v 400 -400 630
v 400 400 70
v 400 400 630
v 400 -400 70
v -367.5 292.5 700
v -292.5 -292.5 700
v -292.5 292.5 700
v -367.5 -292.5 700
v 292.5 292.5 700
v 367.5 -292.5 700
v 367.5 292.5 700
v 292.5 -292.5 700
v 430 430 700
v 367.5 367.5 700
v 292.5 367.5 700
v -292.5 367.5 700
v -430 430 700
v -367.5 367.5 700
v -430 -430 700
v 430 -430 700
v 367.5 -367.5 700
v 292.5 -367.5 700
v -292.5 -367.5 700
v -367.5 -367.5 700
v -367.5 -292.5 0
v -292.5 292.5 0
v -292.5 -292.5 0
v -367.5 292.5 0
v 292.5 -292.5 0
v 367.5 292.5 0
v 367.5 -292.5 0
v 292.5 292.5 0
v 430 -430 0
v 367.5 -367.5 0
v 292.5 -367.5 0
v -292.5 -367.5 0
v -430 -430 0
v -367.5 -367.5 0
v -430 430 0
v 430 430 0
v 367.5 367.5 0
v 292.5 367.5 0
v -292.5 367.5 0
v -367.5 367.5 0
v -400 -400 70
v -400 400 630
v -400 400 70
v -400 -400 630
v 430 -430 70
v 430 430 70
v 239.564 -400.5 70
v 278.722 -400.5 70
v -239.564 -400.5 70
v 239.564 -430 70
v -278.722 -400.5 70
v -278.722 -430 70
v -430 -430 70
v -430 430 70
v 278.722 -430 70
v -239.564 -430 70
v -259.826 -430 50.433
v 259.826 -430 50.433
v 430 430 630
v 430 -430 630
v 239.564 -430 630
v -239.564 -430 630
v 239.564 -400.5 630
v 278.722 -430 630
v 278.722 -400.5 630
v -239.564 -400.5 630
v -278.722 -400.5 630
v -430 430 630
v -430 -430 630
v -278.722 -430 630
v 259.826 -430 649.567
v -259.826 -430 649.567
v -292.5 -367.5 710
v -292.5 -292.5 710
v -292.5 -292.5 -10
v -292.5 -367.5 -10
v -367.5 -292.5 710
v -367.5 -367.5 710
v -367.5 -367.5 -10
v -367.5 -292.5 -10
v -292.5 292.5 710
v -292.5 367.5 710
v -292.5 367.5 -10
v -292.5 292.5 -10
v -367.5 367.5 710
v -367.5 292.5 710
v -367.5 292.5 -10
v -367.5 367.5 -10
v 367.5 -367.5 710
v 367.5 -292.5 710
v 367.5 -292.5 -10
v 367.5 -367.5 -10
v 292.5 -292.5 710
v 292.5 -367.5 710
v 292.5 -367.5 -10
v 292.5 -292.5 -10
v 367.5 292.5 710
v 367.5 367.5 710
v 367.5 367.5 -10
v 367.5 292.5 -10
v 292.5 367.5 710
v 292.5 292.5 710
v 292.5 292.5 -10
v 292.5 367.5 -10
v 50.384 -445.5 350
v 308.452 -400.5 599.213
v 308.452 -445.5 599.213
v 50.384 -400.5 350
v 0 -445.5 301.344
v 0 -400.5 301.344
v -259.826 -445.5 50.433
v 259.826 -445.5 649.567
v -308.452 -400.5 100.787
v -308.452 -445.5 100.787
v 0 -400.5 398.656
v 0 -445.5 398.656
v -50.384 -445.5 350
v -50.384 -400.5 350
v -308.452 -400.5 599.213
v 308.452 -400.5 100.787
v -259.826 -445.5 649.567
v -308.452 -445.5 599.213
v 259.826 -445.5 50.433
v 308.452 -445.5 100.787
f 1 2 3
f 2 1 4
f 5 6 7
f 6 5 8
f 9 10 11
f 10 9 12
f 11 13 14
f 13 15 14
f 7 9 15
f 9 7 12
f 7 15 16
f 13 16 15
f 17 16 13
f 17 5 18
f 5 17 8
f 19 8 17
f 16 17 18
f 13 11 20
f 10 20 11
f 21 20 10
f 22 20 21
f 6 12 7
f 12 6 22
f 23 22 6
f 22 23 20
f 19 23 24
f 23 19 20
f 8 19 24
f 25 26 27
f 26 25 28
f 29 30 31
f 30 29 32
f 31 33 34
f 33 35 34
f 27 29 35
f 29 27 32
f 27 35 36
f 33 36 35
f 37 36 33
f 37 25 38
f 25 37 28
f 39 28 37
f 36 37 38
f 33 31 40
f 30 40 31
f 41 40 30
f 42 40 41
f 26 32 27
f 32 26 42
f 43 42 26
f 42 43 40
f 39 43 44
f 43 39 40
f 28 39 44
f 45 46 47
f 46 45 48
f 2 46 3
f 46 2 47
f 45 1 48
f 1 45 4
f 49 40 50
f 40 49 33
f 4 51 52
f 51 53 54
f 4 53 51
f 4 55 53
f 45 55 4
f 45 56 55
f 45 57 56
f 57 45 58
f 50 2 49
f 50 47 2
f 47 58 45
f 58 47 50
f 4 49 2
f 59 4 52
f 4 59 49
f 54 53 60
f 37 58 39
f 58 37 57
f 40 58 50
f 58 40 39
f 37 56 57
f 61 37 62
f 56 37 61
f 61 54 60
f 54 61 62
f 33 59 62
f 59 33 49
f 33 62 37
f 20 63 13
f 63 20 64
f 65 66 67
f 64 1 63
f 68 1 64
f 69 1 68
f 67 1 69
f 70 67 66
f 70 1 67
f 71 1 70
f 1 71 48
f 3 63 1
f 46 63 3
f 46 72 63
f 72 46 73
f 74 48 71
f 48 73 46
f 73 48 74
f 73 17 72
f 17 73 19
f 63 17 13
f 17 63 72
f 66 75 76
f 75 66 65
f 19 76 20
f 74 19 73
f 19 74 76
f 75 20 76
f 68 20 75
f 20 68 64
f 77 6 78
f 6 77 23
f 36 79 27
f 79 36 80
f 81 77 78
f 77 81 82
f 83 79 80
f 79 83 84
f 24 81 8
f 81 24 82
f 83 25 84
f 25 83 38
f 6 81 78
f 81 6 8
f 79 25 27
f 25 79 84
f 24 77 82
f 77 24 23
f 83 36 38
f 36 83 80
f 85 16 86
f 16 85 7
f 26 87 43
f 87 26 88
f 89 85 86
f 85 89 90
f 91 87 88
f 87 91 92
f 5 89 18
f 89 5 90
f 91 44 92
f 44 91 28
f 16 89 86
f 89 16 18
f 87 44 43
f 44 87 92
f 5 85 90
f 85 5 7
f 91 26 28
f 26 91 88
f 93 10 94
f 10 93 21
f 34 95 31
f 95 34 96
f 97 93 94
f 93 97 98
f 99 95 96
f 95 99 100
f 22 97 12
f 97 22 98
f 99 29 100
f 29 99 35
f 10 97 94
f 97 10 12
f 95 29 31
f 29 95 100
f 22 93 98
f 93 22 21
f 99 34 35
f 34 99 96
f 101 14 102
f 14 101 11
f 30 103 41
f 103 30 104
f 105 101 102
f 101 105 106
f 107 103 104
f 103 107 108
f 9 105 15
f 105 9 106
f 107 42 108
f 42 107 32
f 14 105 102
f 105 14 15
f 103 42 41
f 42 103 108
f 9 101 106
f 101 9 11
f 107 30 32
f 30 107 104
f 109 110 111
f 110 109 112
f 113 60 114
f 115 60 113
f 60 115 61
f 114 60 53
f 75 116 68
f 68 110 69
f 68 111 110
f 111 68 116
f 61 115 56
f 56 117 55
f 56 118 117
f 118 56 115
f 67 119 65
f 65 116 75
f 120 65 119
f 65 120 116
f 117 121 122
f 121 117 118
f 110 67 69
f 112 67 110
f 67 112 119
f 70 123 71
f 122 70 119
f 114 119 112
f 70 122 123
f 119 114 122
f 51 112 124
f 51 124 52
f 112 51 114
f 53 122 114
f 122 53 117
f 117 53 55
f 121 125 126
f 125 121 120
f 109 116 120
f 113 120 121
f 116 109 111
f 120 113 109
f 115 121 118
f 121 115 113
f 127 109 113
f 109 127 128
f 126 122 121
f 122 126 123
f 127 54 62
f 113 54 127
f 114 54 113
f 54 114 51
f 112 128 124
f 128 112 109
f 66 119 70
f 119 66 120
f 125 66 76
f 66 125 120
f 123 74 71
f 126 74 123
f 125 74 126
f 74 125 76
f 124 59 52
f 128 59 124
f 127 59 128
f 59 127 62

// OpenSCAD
// Generated by AXM Machine Geometry Foundry 0.4.0
// Asset: AXM-CRATE-001 AXM Reinforced Modular Crate v0.4.0
// Units: millimetres; source orientation: +Z up, -Y forward.
// Canonical source is recipe.json. This is an editable generated bridge.

// instance: body | base: body | print_group: body
color([0.09412, 0.11373, 0.15294, 1.00000])
translate([0, 0, 350]) rotate([0, 0, 0]) scale([1, 1, 1]) cube([800, 800, 700], center=true);

// instance: bottom_rim | base: bottom_rim | print_group: bottom_rim
color([0.17647, 0.22745, 0.29804, 1.00000])
translate([0, 0, 35]) rotate([0, 0, 0]) scale([1, 1, 1]) cube([860, 860, 70], center=true);

// instance: top_rim | base: top_rim | print_group: top_rim
color([0.17647, 0.22745, 0.29804, 1.00000])
translate([0, 0, 665]) rotate([0, 0, 0]) scale([1, 1, 1]) cube([860, 860, 70], center=true);

// instance: corner_post__g00 | base: corner_post | print_group: corner_post
color([0.17647, 0.22745, 0.29804, 1.00000])
translate([-330, -330, 350]) rotate([0, 0, 0]) scale([1, 1, 1]) cube([75, 75, 720], center=true);

// instance: corner_post__g01 | base: corner_post | print_group: corner_post
color([0.17647, 0.22745, 0.29804, 1.00000])
translate([-330, 330, 350]) rotate([0, 0, 0]) scale([1, 1, 1]) cube([75, 75, 720], center=true);

// instance: corner_post__g02 | base: corner_post | print_group: corner_post
color([0.17647, 0.22745, 0.29804, 1.00000])
translate([330, -330, 350]) rotate([0, 0, 0]) scale([1, 1, 1]) cube([75, 75, 720], center=true);

// instance: corner_post__g03 | base: corner_post | print_group: corner_post
color([0.17647, 0.22745, 0.29804, 1.00000])
translate([330, 330, 350]) rotate([0, 0, 0]) scale([1, 1, 1]) cube([75, 75, 720], center=true);

// instance: front_brace_a | base: front_brace_a | print_group: front_brace_a
color([0.13725, 0.80392, 0.92157, 1.00000])
translate([0, -423, 350]) rotate([0, 46, 0]) scale([1, 1, 1]) cube([70, 45, 790], center=true);

// instance: front_brace_b | base: front_brace_b | print_group: front_brace_b
color([0.13725, 0.80392, 0.92157, 1.00000])
translate([0, -423, 350]) rotate([0, -46, 0]) scale([1, 1, 1]) cube([70, 45, 790], center=true);
